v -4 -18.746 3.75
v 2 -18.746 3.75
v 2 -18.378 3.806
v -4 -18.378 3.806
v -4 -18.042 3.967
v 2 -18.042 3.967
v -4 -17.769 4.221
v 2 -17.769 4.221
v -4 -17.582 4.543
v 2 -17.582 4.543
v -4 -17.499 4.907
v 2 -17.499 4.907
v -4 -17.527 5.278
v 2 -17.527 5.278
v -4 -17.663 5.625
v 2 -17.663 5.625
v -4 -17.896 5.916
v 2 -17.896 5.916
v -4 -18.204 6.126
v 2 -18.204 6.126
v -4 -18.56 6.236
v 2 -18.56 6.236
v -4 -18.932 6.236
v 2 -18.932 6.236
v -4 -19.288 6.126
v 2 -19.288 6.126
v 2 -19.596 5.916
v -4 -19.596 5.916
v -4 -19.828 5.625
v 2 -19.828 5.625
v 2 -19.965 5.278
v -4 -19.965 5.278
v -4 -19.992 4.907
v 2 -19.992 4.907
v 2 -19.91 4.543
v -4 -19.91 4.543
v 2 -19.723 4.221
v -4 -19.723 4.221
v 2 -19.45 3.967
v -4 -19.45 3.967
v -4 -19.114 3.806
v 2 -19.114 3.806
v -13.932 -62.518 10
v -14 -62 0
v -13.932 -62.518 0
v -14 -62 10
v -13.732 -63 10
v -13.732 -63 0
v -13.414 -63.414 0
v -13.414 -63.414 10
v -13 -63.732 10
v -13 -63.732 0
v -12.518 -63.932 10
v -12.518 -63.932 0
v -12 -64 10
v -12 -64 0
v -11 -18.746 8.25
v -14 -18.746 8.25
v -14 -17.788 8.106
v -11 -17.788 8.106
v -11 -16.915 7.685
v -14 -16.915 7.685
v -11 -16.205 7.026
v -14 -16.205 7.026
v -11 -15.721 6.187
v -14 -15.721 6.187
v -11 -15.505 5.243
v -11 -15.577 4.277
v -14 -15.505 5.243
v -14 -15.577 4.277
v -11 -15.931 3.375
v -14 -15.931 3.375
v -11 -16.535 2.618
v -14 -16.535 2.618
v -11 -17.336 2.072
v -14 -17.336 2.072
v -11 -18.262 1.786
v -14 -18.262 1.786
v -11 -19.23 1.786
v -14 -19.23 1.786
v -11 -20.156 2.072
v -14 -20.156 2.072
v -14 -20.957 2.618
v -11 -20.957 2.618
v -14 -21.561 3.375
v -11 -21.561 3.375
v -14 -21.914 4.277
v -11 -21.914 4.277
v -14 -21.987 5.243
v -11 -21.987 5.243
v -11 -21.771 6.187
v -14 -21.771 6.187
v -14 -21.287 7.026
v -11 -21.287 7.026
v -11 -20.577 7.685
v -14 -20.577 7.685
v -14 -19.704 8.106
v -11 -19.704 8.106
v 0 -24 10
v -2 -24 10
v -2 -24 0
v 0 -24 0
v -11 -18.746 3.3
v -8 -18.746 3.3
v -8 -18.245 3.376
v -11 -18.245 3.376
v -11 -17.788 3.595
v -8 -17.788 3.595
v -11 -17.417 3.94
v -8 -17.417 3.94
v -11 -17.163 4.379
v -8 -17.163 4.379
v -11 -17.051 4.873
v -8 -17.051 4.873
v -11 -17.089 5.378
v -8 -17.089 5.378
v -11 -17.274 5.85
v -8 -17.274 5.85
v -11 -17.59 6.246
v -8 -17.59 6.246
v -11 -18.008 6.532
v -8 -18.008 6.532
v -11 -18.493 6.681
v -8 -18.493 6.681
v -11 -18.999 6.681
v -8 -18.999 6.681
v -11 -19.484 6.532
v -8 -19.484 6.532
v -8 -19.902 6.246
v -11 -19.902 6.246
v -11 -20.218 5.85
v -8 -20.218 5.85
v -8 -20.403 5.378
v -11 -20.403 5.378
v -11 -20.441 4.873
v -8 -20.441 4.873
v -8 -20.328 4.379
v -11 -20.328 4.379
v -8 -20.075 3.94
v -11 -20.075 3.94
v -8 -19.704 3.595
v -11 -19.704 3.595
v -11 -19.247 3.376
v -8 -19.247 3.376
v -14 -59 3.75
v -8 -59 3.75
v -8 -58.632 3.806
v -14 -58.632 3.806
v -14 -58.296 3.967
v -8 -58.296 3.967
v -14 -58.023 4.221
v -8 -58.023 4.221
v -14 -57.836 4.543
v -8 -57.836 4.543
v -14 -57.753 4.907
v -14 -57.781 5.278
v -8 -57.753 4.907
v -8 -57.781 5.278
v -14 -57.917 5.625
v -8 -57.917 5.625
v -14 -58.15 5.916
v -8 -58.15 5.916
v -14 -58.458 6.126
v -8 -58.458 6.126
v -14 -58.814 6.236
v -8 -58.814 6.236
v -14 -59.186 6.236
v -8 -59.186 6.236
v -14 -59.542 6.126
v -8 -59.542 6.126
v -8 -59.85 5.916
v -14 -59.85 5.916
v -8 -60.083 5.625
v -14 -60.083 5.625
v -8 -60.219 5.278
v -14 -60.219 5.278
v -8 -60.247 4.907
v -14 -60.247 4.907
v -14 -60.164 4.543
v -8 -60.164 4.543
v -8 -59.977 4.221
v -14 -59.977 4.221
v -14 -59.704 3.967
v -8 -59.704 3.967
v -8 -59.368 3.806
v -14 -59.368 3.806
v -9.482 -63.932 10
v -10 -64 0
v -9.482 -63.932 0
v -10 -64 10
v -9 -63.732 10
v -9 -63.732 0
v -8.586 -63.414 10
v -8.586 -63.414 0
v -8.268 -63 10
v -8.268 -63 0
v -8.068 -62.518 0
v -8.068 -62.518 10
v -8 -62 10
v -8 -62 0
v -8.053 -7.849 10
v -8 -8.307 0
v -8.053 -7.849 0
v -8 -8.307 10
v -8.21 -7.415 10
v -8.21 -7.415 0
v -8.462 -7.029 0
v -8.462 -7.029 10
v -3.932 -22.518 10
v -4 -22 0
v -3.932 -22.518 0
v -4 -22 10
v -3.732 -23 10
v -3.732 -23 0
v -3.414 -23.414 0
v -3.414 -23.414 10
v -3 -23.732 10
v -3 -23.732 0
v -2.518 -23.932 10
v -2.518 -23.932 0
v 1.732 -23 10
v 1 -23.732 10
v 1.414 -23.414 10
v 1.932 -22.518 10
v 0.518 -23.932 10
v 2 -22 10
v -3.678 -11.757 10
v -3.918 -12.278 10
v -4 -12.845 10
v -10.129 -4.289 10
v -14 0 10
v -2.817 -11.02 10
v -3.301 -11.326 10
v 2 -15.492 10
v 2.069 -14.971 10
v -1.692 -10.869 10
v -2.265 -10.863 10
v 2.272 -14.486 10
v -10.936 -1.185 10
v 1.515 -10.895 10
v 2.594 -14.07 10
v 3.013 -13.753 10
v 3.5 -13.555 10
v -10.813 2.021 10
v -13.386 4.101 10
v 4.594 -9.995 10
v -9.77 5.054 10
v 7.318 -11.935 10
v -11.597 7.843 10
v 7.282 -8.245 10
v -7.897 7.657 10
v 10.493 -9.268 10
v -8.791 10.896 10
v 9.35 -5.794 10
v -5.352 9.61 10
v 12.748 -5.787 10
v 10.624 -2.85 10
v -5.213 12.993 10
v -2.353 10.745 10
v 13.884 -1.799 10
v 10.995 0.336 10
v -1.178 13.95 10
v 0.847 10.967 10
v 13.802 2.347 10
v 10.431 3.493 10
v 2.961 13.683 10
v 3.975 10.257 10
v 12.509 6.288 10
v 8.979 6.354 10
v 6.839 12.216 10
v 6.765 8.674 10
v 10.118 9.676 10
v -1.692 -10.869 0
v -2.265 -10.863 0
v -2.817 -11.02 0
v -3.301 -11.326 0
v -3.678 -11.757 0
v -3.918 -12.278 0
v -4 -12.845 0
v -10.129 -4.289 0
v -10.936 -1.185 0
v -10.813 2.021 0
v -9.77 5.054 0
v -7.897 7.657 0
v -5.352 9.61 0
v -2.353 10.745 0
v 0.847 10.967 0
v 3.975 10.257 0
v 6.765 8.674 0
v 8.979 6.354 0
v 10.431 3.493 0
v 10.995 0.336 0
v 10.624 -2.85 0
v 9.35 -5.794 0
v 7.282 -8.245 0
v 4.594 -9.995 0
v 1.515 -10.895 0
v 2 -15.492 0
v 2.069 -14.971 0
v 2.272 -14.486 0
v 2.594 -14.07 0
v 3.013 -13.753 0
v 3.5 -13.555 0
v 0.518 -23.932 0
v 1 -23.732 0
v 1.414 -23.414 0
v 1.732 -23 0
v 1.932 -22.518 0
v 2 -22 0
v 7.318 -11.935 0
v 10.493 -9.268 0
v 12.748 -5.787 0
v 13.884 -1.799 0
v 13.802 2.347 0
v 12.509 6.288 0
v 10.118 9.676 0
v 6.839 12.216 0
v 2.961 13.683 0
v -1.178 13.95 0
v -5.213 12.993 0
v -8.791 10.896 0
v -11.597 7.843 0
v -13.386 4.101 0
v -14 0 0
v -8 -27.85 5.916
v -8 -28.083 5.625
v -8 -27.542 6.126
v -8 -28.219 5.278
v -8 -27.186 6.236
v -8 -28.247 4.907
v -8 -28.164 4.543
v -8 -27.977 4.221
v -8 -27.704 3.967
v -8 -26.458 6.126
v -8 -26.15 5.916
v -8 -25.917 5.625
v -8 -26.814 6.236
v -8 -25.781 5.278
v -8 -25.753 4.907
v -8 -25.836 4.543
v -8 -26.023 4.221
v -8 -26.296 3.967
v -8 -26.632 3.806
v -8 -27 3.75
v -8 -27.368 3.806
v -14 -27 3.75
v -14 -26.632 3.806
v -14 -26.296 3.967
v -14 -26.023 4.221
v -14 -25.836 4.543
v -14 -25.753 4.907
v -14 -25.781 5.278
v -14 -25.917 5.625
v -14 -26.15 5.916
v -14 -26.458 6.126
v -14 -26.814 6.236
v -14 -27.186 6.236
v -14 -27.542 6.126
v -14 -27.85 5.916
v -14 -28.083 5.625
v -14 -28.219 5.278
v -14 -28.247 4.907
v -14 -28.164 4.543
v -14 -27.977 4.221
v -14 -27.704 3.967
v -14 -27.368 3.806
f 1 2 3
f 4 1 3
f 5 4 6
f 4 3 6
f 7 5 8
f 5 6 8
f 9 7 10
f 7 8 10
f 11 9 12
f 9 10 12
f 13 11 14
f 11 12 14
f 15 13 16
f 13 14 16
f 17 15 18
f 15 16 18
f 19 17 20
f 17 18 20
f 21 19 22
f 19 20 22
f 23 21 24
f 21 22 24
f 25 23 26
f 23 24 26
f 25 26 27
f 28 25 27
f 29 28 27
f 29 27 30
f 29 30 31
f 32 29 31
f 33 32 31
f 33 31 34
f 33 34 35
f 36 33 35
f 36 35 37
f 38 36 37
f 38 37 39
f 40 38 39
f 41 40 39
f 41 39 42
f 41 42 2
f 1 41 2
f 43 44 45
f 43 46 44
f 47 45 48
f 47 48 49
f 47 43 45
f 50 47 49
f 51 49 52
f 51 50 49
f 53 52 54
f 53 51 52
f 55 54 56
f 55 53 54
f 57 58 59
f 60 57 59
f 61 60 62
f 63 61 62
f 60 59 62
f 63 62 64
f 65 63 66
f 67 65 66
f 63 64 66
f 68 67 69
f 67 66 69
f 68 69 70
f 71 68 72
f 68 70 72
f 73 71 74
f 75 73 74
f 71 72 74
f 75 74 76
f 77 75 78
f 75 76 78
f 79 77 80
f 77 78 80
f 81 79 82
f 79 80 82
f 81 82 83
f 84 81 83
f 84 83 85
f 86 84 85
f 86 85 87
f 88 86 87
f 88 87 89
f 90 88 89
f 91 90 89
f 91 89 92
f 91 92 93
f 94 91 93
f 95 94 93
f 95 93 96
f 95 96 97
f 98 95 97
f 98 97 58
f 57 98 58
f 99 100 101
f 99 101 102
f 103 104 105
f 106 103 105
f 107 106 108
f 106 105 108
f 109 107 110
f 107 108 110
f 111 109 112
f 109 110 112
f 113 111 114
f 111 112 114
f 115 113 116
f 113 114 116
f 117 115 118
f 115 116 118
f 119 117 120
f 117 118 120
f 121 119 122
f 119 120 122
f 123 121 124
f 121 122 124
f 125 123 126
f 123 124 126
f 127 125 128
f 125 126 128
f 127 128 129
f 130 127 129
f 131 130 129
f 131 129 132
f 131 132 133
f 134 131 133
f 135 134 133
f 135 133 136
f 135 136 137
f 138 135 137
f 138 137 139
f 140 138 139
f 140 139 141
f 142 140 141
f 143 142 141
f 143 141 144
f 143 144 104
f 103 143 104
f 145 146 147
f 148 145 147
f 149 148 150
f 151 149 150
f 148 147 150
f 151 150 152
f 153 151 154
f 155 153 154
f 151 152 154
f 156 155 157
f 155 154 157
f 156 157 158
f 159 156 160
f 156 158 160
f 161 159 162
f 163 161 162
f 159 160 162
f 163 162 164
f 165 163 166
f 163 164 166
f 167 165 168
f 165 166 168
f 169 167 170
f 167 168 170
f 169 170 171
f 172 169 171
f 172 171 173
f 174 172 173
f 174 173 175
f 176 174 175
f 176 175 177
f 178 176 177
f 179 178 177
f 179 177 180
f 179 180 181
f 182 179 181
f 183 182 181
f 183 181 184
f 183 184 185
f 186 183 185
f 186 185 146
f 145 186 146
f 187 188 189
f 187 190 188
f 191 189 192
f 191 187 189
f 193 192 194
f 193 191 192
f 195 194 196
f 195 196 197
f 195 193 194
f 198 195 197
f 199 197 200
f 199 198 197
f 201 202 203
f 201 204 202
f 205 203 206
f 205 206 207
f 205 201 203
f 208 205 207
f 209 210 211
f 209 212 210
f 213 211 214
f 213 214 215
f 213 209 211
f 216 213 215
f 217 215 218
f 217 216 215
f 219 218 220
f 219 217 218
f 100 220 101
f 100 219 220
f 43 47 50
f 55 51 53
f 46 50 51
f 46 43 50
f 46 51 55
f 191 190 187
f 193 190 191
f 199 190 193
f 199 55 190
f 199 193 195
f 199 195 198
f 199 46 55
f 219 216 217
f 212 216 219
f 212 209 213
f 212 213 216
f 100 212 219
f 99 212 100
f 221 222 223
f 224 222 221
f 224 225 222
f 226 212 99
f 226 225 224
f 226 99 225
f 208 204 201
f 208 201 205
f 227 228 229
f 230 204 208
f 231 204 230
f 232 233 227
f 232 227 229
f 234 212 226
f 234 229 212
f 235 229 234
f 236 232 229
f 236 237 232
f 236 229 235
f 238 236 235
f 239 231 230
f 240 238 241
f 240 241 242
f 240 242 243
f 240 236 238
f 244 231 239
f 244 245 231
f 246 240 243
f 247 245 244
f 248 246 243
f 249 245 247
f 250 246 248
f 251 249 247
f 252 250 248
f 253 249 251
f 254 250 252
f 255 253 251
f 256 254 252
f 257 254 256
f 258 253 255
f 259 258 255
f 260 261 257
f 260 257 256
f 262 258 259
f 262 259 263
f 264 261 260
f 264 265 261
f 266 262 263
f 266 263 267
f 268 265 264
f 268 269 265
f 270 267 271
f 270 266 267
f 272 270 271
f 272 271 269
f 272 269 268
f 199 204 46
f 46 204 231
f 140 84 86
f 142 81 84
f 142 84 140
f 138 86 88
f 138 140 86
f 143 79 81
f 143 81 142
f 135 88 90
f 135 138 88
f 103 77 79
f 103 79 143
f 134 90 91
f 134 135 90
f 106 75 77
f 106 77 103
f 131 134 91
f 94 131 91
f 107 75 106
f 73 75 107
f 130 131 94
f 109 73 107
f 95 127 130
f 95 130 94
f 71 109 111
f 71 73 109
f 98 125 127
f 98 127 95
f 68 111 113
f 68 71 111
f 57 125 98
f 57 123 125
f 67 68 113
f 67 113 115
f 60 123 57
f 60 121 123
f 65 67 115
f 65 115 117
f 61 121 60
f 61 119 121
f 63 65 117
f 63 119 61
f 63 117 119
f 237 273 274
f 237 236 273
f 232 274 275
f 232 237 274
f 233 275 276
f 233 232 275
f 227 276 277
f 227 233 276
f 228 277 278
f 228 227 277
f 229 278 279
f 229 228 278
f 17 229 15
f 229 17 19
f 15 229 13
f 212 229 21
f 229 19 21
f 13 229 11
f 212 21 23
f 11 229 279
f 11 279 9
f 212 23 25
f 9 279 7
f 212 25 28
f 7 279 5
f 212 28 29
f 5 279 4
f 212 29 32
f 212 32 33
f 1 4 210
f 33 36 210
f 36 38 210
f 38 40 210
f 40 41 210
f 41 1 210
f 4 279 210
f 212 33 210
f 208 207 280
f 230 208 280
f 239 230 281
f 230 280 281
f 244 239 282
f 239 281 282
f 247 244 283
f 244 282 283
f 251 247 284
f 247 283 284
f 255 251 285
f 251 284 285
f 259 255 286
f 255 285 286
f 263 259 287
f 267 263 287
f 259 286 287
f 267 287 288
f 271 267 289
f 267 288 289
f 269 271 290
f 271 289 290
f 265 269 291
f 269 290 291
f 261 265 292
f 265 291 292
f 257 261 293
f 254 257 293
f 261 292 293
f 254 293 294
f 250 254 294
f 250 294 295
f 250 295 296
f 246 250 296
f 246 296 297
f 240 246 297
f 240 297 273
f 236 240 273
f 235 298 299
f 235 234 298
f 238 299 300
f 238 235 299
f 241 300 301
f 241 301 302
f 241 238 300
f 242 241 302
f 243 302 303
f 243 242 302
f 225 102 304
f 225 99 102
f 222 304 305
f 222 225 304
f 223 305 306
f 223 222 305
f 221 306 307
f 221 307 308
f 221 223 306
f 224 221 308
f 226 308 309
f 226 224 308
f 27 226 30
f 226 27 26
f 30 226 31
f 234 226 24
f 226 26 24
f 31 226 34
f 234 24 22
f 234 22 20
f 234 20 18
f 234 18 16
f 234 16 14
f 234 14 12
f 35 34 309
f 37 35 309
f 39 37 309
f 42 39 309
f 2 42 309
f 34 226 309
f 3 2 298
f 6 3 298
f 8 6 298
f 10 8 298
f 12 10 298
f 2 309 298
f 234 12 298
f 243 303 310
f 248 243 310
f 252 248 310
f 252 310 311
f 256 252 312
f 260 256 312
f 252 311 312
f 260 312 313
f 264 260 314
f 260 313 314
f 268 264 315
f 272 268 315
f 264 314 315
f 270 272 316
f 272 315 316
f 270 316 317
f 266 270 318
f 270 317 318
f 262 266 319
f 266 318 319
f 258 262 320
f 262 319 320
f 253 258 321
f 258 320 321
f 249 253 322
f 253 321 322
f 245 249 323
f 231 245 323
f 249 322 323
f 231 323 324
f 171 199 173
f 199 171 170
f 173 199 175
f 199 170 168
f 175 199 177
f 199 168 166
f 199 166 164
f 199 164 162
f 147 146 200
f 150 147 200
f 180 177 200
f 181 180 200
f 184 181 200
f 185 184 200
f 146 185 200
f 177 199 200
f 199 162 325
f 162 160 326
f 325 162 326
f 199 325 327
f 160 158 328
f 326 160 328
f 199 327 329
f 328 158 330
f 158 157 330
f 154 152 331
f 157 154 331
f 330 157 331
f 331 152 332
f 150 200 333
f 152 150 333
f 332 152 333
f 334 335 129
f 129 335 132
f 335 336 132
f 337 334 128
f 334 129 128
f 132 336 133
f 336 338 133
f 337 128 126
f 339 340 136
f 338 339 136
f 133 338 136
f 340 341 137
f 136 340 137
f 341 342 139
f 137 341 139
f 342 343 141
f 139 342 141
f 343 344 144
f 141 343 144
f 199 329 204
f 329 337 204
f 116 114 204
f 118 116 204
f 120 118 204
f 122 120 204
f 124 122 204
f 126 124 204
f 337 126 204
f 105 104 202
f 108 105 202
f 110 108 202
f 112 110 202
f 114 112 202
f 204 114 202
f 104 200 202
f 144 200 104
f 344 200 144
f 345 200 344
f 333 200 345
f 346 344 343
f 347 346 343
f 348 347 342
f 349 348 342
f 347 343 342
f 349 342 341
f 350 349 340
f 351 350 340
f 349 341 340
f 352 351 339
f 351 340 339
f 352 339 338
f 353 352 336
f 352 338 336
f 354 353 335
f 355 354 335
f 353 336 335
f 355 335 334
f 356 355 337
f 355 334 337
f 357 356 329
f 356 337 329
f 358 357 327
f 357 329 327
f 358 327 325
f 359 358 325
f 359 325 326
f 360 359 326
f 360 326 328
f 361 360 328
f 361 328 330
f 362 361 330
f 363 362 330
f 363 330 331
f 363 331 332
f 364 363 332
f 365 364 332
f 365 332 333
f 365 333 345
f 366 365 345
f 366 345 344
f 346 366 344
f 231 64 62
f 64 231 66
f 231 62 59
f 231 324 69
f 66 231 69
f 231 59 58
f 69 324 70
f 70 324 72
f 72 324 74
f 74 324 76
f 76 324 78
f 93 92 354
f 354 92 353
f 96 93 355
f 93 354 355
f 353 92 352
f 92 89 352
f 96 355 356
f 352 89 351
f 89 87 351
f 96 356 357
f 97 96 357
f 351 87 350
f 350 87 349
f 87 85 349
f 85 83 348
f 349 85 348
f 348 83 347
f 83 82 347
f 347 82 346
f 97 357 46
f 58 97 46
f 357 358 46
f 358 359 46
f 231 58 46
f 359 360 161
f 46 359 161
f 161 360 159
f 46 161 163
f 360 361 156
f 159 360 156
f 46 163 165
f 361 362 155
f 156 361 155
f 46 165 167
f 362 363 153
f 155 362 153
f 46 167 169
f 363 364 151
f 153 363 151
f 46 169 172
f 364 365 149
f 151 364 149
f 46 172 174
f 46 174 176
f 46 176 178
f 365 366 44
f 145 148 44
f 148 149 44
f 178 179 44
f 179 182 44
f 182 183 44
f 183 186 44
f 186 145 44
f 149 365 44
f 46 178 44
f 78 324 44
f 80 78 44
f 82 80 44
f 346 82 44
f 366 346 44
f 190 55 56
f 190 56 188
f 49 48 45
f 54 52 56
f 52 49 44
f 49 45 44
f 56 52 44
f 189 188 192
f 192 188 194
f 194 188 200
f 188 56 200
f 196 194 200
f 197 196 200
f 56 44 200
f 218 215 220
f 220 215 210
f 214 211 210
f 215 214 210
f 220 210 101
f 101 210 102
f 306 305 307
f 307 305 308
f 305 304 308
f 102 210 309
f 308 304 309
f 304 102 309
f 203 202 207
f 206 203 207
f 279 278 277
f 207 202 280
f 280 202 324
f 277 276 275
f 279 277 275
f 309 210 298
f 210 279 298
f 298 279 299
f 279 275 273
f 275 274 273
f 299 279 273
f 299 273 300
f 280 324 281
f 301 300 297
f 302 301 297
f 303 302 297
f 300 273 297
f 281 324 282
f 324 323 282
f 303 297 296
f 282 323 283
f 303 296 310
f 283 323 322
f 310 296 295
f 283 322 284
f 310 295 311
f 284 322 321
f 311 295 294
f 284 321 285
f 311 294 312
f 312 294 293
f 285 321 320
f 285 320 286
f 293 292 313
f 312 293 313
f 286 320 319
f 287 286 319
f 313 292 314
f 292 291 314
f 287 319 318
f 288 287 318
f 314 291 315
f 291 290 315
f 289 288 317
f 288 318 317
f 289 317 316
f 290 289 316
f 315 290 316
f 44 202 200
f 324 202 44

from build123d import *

# Parameters (mm, degrees)
EXTRUDE_1_DEPTH             = 10
FILLET_1_R                  = 2
HOLE_WIZARD_M31_D           = 3.4
HOLE_WIZARD_M31_DEPTH       = 6
HOLE_WIZARD_M31_CBORE_D     = 6.5
HOLE_WIZARD_M31_CBORE_DEPTH = 3
M3X0_51_D                   = 2.5
M3X0_51_DEPTH               = 6
M3X0_52_D                   = 2.5


with BuildPart() as part:
    # Эскиз1 → Бобышка-Вытянуть1 (new body)
    with BuildSketch(Plane.XY):
        with BuildLine():
            Line((-14, 0), (-14, -64))
            Line((-14, -64), (-8, -64))
            Line((-8, -64), (-8, -7.549834435))
            ThreePointArc((-8, -7.549834435), (6.149683661, 9.120383264), (-4, -10.246950766))
            Line((-4, -10.246950766), (-4, -24))
            Line((-4, -24), (2, -24))
            Line((2, -24), (2, -13.856406461))
            ThreePointArc((2, -13.856406461), (9.16515139, 10.583005244), (-14, 0))
        make_face()
    extrude(amount=EXTRUDE_1_DEPTH)

    # Скругление1
    fillet_1_edges = [part.edges().sort_by_distance(p)[0] for p in [
        (2, -13.856406461, 5),
        (2, -24, 5),
        (-4, -24, 5),
        (-4, -10.246950766, 5),
        (-8, -7.549834435, 5),
        (-8, -64, 5),
        (-14, -64, 5),
    ]]
    fillet(fillet_1_edges, radius=FILLET_1_R)

    # Цековка для винта с внутренним шестигранником M31
    with Locations(Plane.ZY.offset(14)):
        with Locations((5, -18.745966692)):
            CounterBoreHole(HOLE_WIZARD_M31_D / 2, HOLE_WIZARD_M31_CBORE_D / 2, HOLE_WIZARD_M31_CBORE_DEPTH, depth=HOLE_WIZARD_M31_DEPTH)

    # Отверстие обработанное метчиком M3x0.51
    with Locations(Plane.ZY.offset(4)):
        with Locations((5, -18.745966692)):
            Hole(M3X0_51_D / 2, depth=M3X0_51_DEPTH)

    # Отверстие обработанное метчиком M3x0.52 (through all)
    with Locations(Plane.ZY.offset(14)):
        with Locations((5, -27), (5, -59)):
            Hole(M3X0_52_D / 2)


solid = part.part
